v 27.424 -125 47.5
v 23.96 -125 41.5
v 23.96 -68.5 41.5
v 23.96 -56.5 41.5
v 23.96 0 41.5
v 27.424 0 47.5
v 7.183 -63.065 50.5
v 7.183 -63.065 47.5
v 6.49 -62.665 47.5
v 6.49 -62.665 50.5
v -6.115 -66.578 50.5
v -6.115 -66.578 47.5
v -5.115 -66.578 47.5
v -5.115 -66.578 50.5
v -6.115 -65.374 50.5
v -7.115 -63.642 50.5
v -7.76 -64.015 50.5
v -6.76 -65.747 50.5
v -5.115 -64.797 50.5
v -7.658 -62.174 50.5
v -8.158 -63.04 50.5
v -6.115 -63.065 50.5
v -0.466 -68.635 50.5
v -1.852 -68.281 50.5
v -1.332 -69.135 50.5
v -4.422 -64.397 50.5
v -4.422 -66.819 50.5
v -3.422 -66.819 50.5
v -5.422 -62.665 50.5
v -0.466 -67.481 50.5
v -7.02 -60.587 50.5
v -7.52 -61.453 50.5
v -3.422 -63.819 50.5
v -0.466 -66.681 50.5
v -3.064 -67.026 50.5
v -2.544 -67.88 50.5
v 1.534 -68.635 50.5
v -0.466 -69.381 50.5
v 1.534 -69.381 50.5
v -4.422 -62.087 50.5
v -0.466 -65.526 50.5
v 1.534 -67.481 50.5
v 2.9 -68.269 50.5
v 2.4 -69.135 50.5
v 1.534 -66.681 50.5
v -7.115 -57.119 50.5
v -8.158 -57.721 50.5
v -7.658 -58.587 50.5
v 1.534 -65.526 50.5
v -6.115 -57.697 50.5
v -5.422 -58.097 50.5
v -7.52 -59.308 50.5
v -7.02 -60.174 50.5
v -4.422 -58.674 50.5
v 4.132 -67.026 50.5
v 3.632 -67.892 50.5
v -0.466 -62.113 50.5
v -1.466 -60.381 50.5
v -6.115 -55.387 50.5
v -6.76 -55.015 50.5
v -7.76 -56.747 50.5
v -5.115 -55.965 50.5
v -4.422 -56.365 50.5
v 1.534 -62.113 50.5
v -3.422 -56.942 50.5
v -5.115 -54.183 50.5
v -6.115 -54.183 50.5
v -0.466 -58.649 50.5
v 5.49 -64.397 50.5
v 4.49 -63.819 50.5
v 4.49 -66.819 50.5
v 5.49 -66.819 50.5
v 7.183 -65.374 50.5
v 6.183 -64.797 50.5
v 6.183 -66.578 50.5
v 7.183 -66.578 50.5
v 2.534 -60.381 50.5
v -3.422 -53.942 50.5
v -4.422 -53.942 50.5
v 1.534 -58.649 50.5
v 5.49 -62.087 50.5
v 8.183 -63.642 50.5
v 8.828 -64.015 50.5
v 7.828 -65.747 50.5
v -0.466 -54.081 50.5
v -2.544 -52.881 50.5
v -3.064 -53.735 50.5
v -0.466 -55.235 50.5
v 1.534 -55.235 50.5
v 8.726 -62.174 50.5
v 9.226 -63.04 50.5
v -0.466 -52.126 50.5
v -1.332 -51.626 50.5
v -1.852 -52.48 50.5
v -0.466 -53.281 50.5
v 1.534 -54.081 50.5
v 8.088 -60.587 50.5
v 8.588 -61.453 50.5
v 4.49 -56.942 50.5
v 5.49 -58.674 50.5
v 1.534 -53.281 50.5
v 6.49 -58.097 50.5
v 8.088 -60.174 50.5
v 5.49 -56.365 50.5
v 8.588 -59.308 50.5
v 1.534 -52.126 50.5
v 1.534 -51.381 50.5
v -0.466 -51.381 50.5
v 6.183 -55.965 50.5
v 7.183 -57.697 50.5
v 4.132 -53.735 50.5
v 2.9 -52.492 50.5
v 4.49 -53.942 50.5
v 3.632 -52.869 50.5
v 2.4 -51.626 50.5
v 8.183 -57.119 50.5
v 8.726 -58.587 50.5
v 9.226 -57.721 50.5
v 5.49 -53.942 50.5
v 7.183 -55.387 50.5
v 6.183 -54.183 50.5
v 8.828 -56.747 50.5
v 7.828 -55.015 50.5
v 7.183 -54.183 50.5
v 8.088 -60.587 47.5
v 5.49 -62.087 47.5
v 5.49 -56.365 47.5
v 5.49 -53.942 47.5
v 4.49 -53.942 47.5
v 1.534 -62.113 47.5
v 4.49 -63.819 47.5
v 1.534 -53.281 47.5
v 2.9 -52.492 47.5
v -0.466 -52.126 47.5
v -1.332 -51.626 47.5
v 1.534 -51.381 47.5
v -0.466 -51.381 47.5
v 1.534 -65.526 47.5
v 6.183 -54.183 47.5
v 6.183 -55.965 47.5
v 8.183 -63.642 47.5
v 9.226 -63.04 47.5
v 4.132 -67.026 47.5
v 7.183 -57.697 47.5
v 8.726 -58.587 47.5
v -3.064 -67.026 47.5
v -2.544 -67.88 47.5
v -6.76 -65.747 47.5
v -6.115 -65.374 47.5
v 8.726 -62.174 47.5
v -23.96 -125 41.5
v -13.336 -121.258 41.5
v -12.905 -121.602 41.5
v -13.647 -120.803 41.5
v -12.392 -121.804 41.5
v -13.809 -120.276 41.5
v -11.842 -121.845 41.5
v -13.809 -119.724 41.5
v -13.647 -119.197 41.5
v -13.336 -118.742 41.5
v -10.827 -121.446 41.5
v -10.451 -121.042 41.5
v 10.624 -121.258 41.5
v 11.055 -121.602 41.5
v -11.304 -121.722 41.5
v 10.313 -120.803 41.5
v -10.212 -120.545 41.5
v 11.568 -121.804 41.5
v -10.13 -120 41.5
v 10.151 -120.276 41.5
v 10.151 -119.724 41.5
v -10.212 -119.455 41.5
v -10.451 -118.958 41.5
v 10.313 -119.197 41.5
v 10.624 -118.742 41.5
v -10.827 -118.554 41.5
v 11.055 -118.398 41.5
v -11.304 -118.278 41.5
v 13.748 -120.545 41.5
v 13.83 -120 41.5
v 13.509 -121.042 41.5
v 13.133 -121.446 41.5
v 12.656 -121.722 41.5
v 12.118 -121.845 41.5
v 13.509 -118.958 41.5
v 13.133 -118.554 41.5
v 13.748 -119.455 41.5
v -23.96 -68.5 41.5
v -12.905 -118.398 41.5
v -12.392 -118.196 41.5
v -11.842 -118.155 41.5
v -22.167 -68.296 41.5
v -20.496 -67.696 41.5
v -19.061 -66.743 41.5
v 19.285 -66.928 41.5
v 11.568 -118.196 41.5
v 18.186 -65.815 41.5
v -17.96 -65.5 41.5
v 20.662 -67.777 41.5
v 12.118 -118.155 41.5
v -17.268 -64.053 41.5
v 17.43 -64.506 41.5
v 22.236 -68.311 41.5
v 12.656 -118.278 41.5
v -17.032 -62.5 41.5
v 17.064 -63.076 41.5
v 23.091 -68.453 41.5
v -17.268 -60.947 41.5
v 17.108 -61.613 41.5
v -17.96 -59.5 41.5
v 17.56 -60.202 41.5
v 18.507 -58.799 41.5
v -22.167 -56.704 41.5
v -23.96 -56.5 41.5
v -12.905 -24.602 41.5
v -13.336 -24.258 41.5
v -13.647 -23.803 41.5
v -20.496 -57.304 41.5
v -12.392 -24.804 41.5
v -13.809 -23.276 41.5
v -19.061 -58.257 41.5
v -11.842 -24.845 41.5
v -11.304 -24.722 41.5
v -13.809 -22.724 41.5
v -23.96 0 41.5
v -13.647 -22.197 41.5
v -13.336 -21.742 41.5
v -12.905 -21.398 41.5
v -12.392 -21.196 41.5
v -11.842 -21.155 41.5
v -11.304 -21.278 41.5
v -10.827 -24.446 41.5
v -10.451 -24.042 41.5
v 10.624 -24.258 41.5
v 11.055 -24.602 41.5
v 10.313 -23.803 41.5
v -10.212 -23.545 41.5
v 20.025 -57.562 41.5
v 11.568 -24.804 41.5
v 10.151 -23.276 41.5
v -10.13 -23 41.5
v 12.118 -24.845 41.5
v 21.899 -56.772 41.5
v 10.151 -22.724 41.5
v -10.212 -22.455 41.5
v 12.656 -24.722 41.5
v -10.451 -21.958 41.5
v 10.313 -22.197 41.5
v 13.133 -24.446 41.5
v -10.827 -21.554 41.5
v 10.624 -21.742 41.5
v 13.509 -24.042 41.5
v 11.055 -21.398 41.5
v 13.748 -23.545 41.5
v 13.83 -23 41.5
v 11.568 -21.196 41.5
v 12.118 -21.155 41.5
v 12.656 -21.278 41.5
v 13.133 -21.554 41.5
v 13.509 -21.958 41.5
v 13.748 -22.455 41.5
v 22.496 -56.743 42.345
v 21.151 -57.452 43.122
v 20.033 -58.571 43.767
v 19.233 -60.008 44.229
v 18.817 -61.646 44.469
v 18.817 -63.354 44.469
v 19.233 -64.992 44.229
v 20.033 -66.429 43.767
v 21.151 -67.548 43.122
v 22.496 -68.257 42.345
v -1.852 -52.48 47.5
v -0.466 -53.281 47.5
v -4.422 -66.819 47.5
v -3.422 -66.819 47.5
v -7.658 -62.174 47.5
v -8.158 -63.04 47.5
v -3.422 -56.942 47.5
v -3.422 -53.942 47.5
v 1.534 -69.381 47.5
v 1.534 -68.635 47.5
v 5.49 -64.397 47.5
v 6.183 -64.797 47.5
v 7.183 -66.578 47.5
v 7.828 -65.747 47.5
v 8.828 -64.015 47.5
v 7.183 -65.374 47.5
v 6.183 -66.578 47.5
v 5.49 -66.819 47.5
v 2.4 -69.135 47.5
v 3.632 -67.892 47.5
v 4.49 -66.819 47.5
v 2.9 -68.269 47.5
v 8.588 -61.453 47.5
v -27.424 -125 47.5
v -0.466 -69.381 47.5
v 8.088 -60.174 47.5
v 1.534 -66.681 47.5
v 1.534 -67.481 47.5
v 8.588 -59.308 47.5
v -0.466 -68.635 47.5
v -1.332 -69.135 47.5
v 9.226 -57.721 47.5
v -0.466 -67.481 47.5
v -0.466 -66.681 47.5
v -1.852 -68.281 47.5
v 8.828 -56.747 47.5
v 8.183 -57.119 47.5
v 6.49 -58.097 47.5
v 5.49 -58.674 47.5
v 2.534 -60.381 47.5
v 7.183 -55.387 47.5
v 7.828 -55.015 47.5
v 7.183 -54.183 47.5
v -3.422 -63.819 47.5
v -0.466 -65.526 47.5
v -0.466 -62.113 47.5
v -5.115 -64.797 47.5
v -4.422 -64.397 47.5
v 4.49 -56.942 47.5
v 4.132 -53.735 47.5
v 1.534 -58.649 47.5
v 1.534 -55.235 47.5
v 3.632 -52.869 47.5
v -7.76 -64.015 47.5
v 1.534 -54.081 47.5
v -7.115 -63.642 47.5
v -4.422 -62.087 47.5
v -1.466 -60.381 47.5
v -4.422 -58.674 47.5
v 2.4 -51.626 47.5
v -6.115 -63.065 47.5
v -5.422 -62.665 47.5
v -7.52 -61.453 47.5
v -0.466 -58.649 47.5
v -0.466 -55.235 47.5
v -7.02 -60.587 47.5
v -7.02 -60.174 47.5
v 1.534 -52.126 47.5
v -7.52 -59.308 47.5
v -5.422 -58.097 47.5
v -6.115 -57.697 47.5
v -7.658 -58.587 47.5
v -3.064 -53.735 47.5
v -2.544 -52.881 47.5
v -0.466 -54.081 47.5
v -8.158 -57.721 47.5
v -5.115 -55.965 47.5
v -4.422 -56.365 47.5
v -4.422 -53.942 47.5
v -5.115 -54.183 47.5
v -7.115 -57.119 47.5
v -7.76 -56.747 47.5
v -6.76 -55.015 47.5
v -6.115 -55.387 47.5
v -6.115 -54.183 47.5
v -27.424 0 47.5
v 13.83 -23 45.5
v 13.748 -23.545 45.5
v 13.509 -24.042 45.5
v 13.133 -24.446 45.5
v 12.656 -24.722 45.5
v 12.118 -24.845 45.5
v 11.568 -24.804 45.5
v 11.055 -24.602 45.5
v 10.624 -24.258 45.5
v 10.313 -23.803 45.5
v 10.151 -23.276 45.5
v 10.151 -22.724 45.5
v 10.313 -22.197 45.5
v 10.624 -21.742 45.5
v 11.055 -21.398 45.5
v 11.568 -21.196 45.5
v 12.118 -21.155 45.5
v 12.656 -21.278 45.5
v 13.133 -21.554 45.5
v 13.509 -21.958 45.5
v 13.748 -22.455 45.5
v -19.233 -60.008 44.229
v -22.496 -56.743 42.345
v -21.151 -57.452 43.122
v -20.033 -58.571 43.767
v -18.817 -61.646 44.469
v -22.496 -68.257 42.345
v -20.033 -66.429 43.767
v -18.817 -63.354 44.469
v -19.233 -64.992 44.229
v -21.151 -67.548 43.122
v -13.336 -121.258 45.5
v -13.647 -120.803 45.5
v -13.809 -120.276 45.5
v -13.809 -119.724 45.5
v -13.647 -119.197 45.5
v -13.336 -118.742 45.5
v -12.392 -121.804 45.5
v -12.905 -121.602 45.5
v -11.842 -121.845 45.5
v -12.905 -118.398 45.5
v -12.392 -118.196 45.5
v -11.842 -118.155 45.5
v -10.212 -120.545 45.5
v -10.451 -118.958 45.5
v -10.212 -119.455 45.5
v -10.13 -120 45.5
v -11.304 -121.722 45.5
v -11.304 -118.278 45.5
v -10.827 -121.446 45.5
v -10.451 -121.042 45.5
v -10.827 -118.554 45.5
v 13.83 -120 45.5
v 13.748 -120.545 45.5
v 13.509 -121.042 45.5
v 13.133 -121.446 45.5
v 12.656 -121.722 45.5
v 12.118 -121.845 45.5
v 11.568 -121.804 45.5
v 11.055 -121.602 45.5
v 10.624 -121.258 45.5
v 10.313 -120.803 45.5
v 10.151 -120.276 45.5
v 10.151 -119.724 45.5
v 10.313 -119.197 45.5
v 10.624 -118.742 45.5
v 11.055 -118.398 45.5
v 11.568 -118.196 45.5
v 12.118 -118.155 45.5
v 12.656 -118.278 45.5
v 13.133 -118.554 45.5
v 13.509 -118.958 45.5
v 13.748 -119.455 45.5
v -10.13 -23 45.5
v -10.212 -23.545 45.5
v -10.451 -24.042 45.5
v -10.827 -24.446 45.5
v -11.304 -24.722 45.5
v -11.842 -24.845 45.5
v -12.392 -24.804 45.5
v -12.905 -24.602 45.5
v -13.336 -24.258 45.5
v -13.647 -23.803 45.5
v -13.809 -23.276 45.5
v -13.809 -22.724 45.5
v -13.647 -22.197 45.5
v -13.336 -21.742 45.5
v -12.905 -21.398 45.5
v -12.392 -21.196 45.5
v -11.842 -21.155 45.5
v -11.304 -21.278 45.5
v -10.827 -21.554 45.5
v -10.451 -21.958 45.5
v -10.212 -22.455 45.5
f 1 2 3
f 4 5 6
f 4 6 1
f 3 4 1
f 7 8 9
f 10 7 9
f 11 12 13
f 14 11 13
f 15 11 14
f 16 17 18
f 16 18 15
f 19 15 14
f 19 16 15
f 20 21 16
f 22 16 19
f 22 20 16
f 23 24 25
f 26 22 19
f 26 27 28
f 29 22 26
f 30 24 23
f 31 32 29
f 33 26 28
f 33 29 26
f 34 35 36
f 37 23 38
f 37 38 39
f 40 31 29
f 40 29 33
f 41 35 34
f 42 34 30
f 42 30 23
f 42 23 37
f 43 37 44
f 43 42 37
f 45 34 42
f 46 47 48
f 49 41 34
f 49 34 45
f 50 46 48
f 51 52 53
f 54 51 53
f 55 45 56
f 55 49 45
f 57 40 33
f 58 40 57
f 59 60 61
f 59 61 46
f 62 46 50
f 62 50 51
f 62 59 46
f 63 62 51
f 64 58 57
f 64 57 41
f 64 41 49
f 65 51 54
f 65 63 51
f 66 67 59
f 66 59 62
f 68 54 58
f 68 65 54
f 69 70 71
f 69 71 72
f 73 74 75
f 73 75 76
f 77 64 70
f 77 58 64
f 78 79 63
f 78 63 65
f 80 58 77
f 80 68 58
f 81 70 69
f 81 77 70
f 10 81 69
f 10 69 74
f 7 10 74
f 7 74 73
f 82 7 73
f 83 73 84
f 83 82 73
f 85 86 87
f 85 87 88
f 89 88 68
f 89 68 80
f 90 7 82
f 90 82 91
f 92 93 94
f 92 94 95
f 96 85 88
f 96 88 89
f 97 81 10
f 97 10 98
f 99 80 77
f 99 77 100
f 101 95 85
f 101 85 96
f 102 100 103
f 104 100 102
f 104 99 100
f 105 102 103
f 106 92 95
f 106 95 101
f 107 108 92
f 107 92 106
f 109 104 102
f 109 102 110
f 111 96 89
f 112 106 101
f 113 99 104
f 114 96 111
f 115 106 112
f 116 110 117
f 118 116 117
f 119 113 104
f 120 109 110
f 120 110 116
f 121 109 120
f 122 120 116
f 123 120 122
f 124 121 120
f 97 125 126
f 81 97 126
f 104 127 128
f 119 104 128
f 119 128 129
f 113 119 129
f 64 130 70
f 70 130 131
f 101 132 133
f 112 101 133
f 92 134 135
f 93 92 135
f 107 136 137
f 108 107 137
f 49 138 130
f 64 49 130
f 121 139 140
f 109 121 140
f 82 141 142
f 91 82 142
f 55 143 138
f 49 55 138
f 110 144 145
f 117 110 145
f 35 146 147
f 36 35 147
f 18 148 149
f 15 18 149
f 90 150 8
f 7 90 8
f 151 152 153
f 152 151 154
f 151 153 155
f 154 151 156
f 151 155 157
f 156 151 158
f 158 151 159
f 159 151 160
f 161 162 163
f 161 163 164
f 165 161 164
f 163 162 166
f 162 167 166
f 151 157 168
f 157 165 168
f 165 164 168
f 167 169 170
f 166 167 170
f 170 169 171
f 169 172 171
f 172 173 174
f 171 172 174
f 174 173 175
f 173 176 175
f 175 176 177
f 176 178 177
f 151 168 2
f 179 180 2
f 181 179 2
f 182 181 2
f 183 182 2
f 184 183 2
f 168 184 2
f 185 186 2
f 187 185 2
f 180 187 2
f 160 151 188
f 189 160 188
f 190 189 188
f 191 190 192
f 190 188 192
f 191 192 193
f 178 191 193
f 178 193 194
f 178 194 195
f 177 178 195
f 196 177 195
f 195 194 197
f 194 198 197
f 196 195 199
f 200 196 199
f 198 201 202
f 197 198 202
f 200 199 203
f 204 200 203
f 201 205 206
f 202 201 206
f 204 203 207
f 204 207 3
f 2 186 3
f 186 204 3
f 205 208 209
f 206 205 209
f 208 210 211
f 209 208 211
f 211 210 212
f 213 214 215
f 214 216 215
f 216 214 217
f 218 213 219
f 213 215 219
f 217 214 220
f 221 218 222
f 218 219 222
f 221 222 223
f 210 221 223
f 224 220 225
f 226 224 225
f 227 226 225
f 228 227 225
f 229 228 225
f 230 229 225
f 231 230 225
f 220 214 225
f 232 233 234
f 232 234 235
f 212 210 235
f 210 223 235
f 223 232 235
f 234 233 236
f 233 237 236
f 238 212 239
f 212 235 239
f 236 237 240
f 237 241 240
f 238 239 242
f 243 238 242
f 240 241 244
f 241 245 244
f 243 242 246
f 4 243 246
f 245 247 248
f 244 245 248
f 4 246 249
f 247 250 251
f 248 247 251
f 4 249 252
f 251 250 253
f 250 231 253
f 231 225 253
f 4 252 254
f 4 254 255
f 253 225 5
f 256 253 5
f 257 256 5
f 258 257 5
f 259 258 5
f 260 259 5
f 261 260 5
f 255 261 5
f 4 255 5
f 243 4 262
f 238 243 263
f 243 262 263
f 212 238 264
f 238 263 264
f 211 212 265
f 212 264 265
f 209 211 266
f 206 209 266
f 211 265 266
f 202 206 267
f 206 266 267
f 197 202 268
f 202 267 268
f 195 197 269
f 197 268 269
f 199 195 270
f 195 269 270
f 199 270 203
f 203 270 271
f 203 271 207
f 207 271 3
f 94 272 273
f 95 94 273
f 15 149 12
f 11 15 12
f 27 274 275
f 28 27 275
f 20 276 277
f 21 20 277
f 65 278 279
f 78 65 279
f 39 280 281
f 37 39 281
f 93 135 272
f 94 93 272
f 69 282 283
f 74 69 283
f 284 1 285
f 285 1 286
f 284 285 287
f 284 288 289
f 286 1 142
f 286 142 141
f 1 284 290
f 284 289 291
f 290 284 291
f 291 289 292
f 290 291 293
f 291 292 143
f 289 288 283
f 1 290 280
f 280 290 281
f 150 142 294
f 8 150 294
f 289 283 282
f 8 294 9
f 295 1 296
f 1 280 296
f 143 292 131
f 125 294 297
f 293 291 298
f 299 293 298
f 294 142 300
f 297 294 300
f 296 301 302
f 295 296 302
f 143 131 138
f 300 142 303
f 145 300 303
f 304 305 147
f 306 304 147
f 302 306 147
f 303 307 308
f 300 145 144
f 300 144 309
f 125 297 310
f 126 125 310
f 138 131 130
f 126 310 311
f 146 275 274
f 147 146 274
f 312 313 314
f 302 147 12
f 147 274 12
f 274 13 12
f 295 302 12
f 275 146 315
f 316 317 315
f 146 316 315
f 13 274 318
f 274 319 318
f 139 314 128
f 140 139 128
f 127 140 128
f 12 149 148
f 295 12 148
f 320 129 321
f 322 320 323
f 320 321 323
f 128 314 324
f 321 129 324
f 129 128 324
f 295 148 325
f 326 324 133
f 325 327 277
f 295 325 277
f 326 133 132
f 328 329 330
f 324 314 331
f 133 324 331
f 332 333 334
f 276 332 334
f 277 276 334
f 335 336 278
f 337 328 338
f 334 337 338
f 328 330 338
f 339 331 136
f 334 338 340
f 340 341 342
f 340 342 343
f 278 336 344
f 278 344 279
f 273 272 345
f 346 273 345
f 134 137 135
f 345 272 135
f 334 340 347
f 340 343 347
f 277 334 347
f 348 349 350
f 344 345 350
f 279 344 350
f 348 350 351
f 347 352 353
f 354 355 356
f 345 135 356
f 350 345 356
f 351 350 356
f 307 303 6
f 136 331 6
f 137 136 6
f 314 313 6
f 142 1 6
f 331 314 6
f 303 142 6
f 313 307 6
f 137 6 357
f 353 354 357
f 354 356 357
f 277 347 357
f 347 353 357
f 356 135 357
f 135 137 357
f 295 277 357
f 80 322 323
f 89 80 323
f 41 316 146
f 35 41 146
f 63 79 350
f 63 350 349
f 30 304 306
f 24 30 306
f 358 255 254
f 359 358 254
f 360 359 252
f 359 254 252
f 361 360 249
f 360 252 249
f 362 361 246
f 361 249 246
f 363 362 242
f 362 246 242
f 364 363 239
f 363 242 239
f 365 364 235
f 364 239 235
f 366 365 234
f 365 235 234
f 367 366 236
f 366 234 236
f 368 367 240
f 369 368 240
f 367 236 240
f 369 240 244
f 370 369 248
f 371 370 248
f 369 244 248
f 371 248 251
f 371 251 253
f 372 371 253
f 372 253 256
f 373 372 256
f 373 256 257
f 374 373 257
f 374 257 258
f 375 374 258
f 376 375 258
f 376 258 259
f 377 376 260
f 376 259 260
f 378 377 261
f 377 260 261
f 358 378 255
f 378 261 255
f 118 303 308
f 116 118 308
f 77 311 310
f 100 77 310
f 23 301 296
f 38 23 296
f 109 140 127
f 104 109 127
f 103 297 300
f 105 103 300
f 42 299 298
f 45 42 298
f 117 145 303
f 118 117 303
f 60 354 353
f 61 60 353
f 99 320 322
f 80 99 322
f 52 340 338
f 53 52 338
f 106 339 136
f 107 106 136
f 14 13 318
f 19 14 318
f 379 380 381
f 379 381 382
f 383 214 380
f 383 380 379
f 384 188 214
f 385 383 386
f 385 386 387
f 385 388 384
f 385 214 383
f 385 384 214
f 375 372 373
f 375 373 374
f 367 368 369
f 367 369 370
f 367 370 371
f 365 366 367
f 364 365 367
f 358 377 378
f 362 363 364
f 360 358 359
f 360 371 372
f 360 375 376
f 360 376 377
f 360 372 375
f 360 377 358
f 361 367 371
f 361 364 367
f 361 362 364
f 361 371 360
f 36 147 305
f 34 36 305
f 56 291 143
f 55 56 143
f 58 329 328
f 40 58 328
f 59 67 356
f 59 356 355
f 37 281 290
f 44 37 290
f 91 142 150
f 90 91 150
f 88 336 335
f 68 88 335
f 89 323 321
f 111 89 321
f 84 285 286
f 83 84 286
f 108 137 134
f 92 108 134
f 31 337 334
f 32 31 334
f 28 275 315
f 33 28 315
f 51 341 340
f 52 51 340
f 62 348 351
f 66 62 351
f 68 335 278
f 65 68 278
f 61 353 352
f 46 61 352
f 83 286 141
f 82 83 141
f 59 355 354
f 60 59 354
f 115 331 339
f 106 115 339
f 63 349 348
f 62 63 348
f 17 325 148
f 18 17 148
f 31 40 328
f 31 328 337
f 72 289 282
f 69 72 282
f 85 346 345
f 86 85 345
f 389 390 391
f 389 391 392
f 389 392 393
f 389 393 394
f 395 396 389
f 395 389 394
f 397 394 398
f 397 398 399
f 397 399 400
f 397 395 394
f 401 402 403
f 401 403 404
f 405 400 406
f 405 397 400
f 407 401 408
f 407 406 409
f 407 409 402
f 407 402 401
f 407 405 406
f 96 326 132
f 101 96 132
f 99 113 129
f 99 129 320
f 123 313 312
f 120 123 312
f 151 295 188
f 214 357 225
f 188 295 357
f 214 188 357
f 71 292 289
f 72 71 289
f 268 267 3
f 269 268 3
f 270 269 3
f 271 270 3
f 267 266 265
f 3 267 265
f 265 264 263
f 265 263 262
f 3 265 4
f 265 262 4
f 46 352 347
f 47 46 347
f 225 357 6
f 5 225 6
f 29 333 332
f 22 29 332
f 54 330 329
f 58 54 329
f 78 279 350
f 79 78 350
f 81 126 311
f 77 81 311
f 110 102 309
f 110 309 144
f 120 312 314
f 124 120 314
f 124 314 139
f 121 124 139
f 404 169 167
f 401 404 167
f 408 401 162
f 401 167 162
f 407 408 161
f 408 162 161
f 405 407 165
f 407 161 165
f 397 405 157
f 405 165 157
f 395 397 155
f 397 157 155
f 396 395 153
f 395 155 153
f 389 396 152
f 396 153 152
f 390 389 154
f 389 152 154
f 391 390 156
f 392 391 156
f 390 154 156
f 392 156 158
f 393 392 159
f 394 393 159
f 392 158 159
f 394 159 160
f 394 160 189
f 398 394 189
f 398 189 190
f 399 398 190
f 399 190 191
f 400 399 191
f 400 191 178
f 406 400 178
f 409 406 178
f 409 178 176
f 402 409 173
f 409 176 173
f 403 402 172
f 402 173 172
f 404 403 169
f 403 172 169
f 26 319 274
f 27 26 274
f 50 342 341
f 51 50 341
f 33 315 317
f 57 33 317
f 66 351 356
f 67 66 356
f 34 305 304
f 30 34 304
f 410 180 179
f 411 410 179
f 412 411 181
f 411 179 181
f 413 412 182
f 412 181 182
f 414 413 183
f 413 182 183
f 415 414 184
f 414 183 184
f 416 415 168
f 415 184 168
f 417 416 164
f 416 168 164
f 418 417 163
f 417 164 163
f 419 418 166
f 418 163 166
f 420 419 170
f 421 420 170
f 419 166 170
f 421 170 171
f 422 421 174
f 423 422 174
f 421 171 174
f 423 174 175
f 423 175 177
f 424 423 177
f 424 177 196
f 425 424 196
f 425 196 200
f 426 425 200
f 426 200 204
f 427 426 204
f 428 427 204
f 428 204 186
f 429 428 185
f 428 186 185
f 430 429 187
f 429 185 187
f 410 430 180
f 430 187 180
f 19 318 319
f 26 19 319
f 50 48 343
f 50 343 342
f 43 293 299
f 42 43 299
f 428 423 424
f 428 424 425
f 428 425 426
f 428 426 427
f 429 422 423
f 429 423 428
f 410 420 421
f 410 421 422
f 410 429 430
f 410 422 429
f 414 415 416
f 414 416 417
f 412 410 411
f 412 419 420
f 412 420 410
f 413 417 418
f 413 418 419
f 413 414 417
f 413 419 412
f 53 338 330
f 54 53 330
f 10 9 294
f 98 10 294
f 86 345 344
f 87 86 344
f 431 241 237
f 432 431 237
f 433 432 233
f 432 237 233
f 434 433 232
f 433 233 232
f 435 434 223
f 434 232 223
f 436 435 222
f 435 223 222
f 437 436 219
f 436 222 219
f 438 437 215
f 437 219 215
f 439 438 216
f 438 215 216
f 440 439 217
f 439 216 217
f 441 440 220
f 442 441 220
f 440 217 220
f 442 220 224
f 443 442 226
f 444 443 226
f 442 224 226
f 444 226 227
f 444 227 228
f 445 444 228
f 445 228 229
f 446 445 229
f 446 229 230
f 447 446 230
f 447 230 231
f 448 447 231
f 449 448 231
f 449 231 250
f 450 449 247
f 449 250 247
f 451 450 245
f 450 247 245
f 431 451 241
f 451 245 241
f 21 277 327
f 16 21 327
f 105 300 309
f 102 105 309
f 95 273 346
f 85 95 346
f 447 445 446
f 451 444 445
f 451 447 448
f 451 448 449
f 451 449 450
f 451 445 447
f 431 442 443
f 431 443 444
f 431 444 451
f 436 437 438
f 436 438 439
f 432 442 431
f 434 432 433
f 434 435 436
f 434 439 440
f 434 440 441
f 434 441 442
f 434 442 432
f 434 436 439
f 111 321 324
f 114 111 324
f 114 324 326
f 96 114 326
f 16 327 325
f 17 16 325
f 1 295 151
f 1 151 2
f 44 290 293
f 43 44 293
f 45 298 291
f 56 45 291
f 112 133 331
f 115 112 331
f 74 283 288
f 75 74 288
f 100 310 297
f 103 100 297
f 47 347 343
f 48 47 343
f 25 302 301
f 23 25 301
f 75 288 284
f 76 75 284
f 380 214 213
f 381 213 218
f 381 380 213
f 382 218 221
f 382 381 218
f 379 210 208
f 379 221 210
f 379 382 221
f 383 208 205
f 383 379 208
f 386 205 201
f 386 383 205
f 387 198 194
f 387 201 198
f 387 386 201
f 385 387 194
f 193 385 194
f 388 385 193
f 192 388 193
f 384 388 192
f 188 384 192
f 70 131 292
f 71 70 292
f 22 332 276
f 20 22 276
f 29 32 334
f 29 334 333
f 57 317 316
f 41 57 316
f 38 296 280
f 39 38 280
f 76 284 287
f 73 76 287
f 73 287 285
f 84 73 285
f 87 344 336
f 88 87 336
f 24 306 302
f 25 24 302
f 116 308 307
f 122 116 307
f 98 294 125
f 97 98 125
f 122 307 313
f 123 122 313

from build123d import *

# Parameters (mm, degrees)
F1_DEPTH  = 125
F2_R      = 1.85
F3_DEPTH  = 4
F5_DEPTH  = 3
F7_R      = 6
F8_DEPTH  = 25
F10_R     = 6
F11_DEPTH = 25


with BuildPart() as f1:
    # F0 (on Front) → F1 (new body)
    with BuildSketch(Plane.XZ):
        Polygon((27.4241377865, 47.5), (-27.4241377865, 47.5), (-23.9600361714, 41.5), (23.9600361714, 41.5), align=None)
    extrude(amount=F1_DEPTH)

    # F2 (on face) → F3 (cut)
    with BuildSketch(Plane(origin=(0, 0, 41.5), x_dir=(1, 0, 0), z_dir=(0, 0, -1))):
        with BuildLine():
            ThreePointArc((-13.8300180857, 120), (-11.9800180857, 118.15), (-10.1300180857, 120))
            Line((-10.1300180857, 120), (-13.8300180857, 120))
        make_face()
        with BuildLine():
            Line((-13.8300180857, 120), (-10.1300180857, 120))
            ThreePointArc((-10.1300180857, 120), (-11.9800180857, 121.85), (-13.8300180857, 120))
        make_face()
        with Locations((11.9800180857, 120)):
            Circle(F2_R)
        with BuildLine():
            ThreePointArc((-13.8300180857, 23), (-11.9800180857, 21.15), (-10.1300180857, 23))
            Line((-10.1300180857, 23), (-13.8300180857, 23))
        make_face()
        with BuildLine():
            Line((-13.8300180857, 23), (-10.1300180857, 23))
            ThreePointArc((-10.1300180857, 23), (-11.9800180857, 24.85), (-13.8300180857, 23))
        make_face()
        with Locations((11.9800180857, 23)):
            Circle(F2_R)
    extrude(amount=-F3_DEPTH, mode=Mode.SUBTRACT)

    # F4 (on face) → F5 (join)
    with BuildSketch(Plane.XY.offset(47.5)):
        Polygon((0.5340071506, -61.535328541), (-0.4659928494, -62.1126788102), (-0.4659928494, -65.5259274643), (-0.4659928494, -66.6806280026), (-0.4659928494, -67.4806280026), (-0.4659928494, -68.635328541), (-0.4659928494, -69.3806280026), (1.5340071506, -69.3806280026), (1.5340071506, -68.635328541), (1.5340071506, -67.4806280026), (1.5340071506, -66.6806280026), (1.5340071506, -65.5259274643), (1.5340071506, -62.1126788102), align=None)
        Polygon((2.900031855, -68.2693027335), (1.5340071506, -67.4806280026), (1.5340071506, -68.635328541), (2.4000325544, -69.135328541), align=None)
        Polygon((4.132083362, -67.0259274643), (1.5340071506, -65.5259274643), (1.5340071506, -66.6806280026), (3.6320840614, -67.8919532719), align=None)
        Polygon((-0.4659928494, -68.635328541), (-0.4659928494, -67.4806280026), (-1.8520648707, -68.2808770573), (-1.3320182531, -69.135328541), align=None)
        Polygon((-0.4659928494, -66.6806280026), (-0.4659928494, -65.5259274643), (-3.0640690607, -67.0259274643), (-2.5440224431, -67.880378948), align=None)
        Polygon((-3.4219535926, -66.819303541), (-3.4219535926, -63.819303541), (-4.4219535926, -64.3966538102), (-4.4219535926, -66.819303541), align=None)
        Polygon((-5.1147739156, -66.5781745553), (-5.1147739156, -64.7966538102), (-6.1147739156, -65.3740040794), (-6.1147739156, -66.5781745553), align=None)
        Polygon((-7.1147739156, -63.6419532718), (-6.1147739156, -63.0646030026), (-7.6576161382, -62.1738426302), (-8.1576161382, -63.039868034), align=None)
        Polygon((-5.4219535926, -62.6646030026), (-4.4219535926, -62.0872527334), (-7.0200298039, -60.5872527335), (-7.5200298039, -61.4532781373), align=None)
        Polygon((-4.4219535925, -58.6740032718), (-5.4219535925, -58.0966530026), (-7.5200298039, -59.307977868), (-7.0200298039, -60.1740032718), align=None)
        Polygon((-8.1576161382, -57.7213879713), (-7.6576161382, -58.5874133751), (-6.1147739156, -57.6966530026), (-7.1147739156, -57.1193027334), align=None)
        Polygon((-6.1147739156, -54.18308145), (-6.1147739156, -55.3872519259), (-5.1147739156, -55.964602195), (-5.1147739156, -54.18308145), align=None)
        Polygon((-4.4219535926, -53.9419524643), (-4.4219535926, -56.3646021951), (-3.4219535925, -56.9419524642), (-3.4219535926, -53.9419524643), align=None)
        Polygon((-3.0640690607, -53.735328541), (-0.4659928494, -55.235328541), (-0.4659928494, -54.0806280026), (-2.5440224431, -52.8808770573), align=None)
        Polygon((-1.8520648707, -52.480378948), (-0.4659928494, -53.2806280026), (-0.4659928494, -52.1259274643), (-1.3320182531, -51.6259274643), align=None)
        Polygon((1.5340071506, -52.1259274643), (1.5340071506, -53.2806280026), (2.900031855, -52.4919532718), (2.4000325544, -51.6259274643), align=None)
        Polygon((1.5340071506, -54.0806280026), (1.5340071506, -55.235328541), (4.132083362, -53.735328541), (3.6320840614, -52.8693027334), align=None)
        Polygon((4.4899678938, -53.9419524643), (4.4899678938, -56.9419524643), (5.4899678938, -56.3646021951), (5.4899678938, -53.9419524643), align=None)
        Polygon((6.1827882169, -54.18308145), (6.1827882169, -55.9646021951), (7.1827882169, -55.3872519259), (7.1827882169, -54.18308145), align=None)
        Polygon((8.1827882169, -57.1193027334), (7.1827882169, -57.6966530026), (8.7256304395, -58.5874133751), (9.2256304395, -57.7213879713), align=None)
        Polygon((6.4899678939, -58.0966530026), (5.4899678939, -58.6740032718), (8.0880441052, -60.1740032718), (8.5880441052, -59.307977868), align=None)
        Polygon((8.0880441052, -60.5872527335), (5.4899678939, -62.0872527335), (6.4899678939, -62.6646030027), (8.5880441052, -61.4532781373), align=None)
        Polygon((8.7256304395, -62.1738426302), (7.1827882169, -63.0646030027), (8.1827882169, -63.6419532719), (9.2256304395, -63.039868034), align=None)
        Polygon((7.1827882169, -65.3740040794), (6.1827882169, -64.7966538102), (6.1827882169, -66.5781745553), (7.1827882169, -66.5781745553), align=None)
        Polygon((2.5340071506, -60.3806280026), (1.5340071506, -60.9579782718), (1.5340071506, -62.1126788102), (4.4899678938, -63.819303541), (5.4899678938, -64.3966538102), (6.1827882169, -64.7966538102), (7.1827882169, -65.3740040794), (7.8282364841, -65.7466538103), (8.8282350853, -64.0146021951), (8.1827882169, -63.6419532719), (7.1827882169, -63.0646030027), (6.4899678939, -62.6646030027), (5.4899678939, -62.0872527335), align=None)
        Polygon((-0.4659928494, -60.9579782718), (-1.4659928493, -60.3806280026), (-4.4219535926, -62.0872527334), (-5.4219535926, -62.6646030026), (-6.1147739156, -63.0646030026), (-7.1147739156, -63.6419532718), (-7.7602214834, -64.0146025988), (-6.7602214834, -65.7466534064), (-6.1147739156, -65.3740040794), (-5.1147739156, -64.7966538102), (-4.4219535926, -64.3966538102), (-3.4219535926, -63.819303541), (-0.4659928494, -62.1126788102), align=None)
        Polygon((-7.1147739156, -57.1193027334), (-6.1147739156, -57.6966530026), (-5.4219535925, -58.0966530026), (-4.4219535925, -58.6740032718), (-1.4659928493, -60.3806280026), (-0.4659928494, -59.8032777334), (-0.4659928494, -58.648577195), (-3.4219535925, -56.9419524642), (-4.4219535925, -56.364602195), (-5.1147739156, -55.964602195), (-6.1147739156, -55.3872519258), (-6.7602221828, -55.014602195), (-7.760220784, -56.7466538101), align=None)
        Polygon((1.5340071506, -58.648577195), (1.5340071506, -59.8032777334), (2.5340071506, -60.3806280026), (5.4899678939, -58.6740032718), (6.4899678939, -58.0966530026), (7.1827882169, -57.6966530026), (8.1827882169, -57.1193027334), (8.8282357847, -56.7466534064), (7.8282357847, -55.0146025988), (7.1827882169, -55.3872519259), (6.1827882169, -55.9646021951), (5.4899678938, -56.3646021951), (4.4899678938, -56.9419524643), align=None)
        Polygon((-0.4659928494, -55.235328541), (-0.4659928494, -58.648577195), (0.5340071506, -59.2259274642), (1.5340071506, -58.648577195), (1.5340071506, -55.235328541), (1.5340071506, -54.0806280026), (1.5340071506, -53.2806280026), (1.5340071506, -52.1259274643), (1.5340071506, -51.3806280026), (-0.4659928494, -51.3806280026), (-0.4659928494, -52.1259274643), (-0.4659928494, -53.2806280026), (-0.4659928494, -54.0806280026), align=None)
        Polygon((5.4899678938, -64.3966538102), (4.4899678938, -63.819303541), (4.4899678938, -66.819303541), (5.4899678938, -66.819303541), align=None)
        Polygon((0.5340071506, -61.535328541), (-0.4659928494, -60.9579782718), (-0.4659928494, -62.1126788102), align=None)
        Polygon((1.5340071506, -60.9579782718), (0.5340071506, -61.535328541), (1.5340071506, -62.1126788102), align=None)
        Polygon((2.5340071506, -60.3806280026), (1.5340071506, -59.8032777334), (1.5340071506, -60.9579782718), align=None)
        Polygon((1.5340071506, -58.648577195), (0.5340071506, -59.2259274642), (1.5340071506, -59.8032777334), align=None)
        Polygon((0.5340071506, -59.2259274642), (-0.4659928494, -59.8032777334), (-0.4659928494, -60.9579782718), (0.5340071506, -61.535328541), (1.5340071506, -60.9579782718), (1.5340071506, -59.8032777334), align=None)
        Polygon((-0.4659928494, -59.8032777334), (-1.4659928493, -60.3806280026), (-0.4659928494, -60.9579782718), align=None)
        Polygon((-0.4659928494, -58.648577195), (-0.4659928494, -59.8032777334), (0.5340071506, -59.2259274642), align=None)
    extrude(amount=F5_DEPTH)

    # F7 (on face) → F8 (cut)
    with BuildSketch(Plane(origin=(-23.9600361714, 0, 41.5), x_dir=(0.8660254038, 0, 0.5), z_dir=(0.5, 0, -0.8660254038))):
        with Locations((0, 62.5)):
            Circle(F7_R)
    extrude(amount=F8_DEPTH, mode=Mode.SUBTRACT)

    # F10 (on face) → F11 (cut)
    with BuildSketch(Plane(origin=(23.9600361714, 0, 41.5), x_dir=(0.8660254038, 0, -0.5), z_dir=(0.5, 0, 0.8660254038))):
        with Locations((0, -62.5)):
            Circle(F10_R)
    extrude(amount=-F11_DEPTH, mode=Mode.SUBTRACT)


solid = f1.part
